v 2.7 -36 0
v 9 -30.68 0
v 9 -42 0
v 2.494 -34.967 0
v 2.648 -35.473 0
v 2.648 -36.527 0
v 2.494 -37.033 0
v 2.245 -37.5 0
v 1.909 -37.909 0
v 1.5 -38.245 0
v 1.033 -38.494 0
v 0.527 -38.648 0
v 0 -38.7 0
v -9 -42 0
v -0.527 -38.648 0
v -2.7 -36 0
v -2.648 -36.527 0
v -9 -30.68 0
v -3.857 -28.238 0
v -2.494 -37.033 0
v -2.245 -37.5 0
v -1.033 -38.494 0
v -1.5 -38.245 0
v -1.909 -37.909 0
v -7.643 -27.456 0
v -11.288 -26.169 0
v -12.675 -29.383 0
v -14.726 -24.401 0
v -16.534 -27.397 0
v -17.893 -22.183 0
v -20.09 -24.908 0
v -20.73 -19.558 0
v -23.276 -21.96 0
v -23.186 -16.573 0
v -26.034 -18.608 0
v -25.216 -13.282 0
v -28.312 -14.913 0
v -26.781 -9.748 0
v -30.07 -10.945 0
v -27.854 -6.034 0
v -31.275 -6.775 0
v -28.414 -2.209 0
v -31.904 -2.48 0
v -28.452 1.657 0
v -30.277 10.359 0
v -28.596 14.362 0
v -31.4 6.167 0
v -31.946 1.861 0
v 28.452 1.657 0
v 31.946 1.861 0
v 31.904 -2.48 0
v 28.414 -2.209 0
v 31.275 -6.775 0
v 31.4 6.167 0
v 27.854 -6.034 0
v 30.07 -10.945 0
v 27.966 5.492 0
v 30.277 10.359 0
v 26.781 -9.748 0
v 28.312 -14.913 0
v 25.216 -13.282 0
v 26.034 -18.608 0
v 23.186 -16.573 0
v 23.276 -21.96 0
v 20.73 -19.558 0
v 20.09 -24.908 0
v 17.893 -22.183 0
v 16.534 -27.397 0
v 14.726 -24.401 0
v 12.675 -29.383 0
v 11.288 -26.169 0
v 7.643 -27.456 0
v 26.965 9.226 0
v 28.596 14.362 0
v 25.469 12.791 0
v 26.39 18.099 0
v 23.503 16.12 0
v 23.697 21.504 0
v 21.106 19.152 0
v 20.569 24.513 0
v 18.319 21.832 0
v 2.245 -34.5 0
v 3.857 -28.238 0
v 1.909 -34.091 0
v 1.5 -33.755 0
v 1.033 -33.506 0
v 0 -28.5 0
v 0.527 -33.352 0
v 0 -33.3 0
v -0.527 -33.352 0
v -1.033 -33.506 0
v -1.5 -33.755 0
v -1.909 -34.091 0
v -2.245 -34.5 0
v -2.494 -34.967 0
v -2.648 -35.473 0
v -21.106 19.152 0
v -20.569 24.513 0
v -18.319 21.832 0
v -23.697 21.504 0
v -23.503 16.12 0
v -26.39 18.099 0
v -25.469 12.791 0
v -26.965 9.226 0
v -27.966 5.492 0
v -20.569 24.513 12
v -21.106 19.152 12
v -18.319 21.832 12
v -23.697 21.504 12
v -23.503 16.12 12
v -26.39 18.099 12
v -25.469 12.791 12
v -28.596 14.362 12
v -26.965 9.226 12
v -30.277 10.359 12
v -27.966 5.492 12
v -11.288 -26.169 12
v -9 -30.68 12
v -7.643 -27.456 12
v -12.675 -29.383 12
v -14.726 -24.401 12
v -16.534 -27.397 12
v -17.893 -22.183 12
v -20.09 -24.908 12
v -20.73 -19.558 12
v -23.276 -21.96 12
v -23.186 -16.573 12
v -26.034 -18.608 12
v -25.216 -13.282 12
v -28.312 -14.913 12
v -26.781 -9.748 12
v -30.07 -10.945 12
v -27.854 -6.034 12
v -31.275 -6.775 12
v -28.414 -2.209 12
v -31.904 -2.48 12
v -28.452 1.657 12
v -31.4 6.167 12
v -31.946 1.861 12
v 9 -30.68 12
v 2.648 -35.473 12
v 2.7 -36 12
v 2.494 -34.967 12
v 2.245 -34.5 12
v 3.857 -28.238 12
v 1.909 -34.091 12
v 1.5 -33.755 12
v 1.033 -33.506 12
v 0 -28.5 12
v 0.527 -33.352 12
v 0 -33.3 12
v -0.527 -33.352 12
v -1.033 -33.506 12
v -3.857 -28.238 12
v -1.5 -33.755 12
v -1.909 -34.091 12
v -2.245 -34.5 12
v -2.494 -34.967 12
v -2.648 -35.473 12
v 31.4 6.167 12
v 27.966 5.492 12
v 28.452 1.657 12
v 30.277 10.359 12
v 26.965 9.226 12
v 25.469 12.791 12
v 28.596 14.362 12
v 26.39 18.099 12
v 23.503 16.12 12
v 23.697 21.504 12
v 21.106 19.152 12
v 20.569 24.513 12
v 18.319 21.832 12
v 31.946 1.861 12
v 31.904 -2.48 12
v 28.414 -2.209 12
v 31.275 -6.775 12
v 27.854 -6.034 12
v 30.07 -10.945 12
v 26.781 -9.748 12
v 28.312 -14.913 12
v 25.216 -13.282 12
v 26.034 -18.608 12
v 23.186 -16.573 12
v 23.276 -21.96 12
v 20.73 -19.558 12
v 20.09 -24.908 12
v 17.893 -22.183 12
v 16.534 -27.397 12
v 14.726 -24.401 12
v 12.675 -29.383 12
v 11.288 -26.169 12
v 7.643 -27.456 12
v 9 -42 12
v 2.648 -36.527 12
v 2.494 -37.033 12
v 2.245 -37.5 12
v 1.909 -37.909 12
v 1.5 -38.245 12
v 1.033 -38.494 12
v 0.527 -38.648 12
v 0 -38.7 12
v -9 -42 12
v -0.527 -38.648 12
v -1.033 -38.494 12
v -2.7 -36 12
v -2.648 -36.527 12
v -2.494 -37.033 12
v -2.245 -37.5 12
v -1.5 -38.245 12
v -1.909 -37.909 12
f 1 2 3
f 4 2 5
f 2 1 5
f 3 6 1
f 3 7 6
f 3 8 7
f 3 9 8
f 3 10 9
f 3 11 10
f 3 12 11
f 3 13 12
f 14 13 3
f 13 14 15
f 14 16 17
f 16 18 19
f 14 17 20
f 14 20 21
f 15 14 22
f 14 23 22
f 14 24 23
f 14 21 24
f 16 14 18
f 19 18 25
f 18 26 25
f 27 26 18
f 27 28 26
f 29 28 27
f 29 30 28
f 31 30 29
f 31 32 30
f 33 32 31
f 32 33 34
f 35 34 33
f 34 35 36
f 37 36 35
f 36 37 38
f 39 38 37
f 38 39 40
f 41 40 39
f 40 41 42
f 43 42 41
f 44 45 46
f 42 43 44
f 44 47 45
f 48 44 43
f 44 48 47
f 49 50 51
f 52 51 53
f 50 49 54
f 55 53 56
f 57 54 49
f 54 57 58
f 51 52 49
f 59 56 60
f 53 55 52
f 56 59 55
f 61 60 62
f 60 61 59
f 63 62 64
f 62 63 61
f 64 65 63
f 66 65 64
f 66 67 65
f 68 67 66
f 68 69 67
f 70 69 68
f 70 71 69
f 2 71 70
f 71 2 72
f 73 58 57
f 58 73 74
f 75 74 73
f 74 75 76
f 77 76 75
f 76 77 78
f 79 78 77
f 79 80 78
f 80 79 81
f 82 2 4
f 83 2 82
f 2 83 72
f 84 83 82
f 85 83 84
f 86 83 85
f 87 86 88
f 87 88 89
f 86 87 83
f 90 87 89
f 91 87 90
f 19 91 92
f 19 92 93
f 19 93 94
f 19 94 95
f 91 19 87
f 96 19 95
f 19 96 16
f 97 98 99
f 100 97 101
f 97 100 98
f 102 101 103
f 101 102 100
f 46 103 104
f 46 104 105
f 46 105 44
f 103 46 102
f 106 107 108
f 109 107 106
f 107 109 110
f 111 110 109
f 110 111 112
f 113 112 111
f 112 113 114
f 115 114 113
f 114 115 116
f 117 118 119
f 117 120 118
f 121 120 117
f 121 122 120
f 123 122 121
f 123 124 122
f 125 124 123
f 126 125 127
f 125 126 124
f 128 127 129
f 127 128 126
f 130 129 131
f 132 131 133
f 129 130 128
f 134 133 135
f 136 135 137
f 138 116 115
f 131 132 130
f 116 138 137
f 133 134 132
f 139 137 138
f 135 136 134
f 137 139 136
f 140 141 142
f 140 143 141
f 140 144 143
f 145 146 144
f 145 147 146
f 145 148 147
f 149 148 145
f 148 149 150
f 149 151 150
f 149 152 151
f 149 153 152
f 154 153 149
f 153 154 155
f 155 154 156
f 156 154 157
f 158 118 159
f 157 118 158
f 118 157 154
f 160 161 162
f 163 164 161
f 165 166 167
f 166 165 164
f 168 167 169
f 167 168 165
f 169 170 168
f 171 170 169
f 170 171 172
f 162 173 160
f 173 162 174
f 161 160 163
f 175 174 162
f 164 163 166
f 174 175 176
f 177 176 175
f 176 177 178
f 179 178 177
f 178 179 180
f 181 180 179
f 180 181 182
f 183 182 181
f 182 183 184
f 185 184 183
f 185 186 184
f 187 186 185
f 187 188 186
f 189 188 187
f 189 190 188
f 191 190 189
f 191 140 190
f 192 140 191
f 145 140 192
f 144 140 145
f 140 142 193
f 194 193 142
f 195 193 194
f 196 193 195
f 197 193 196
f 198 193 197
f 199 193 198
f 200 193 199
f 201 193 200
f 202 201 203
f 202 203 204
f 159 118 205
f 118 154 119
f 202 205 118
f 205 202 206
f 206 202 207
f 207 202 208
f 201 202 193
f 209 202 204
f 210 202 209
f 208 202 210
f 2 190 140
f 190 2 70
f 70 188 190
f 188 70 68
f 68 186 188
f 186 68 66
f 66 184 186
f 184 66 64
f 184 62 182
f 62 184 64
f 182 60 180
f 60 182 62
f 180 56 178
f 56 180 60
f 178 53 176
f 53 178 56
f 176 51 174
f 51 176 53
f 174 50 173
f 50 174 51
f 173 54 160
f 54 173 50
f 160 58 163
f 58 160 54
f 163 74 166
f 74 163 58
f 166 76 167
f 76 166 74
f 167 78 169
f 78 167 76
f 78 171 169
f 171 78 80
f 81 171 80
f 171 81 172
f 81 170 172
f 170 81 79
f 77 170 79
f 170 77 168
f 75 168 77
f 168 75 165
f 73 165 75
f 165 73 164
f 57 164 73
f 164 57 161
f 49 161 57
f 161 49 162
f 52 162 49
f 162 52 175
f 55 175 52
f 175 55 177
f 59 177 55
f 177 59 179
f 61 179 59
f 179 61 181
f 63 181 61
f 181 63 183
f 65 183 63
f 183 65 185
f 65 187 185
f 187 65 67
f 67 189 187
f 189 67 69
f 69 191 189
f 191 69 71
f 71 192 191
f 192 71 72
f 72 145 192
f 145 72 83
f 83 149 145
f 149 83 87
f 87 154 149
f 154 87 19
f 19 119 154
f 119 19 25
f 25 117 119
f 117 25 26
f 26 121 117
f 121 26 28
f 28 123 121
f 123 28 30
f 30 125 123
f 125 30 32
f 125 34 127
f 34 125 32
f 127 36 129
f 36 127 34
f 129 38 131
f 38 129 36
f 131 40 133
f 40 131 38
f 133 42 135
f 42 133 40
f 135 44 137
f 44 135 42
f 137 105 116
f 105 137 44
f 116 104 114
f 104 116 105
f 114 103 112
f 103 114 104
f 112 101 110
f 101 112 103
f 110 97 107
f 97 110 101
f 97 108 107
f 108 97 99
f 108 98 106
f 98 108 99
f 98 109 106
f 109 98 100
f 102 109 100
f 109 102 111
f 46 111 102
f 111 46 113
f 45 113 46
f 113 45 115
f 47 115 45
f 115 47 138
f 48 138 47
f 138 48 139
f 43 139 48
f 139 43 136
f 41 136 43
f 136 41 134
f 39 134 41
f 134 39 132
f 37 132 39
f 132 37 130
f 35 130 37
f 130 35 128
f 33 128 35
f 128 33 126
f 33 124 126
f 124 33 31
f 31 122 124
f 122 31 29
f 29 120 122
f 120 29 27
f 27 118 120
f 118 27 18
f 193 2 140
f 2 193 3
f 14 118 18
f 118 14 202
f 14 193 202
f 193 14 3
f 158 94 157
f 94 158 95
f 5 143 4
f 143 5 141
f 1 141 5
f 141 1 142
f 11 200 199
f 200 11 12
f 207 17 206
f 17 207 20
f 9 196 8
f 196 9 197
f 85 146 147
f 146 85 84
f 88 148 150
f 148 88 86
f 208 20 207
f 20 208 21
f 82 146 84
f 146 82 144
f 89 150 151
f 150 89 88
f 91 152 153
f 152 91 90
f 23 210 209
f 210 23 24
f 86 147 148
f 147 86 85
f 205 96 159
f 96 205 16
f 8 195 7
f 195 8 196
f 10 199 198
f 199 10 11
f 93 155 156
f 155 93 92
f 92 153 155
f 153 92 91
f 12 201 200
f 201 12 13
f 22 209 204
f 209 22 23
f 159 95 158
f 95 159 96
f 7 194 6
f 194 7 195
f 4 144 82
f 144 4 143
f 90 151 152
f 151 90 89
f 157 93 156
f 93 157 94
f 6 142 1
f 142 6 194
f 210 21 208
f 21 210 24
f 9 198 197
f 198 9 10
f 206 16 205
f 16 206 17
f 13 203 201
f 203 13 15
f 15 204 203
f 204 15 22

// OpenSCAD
$fn = 32;

// ----------------------------------------------------------------------
// Spring clip: 64 mm outside, 3.5 mm band, 80 degree opening
// ----------------------------------------------------------------------

// --- parameters (mm) ---
outer_r = 32;             // clip outside radius
inner_r = 28.5;           // clip bore radius
band = 3.5;               // band thickness
clip_w = 12;              // clip width
opening = 80;             // opening angle
tab_w = 18;               // tab width
tab_len = 10;             // tab length past the clip
tab_hole = 5.4;           // tab fixing hole

clip_profile = [[-20.569, 24.513], [-23.697, 21.504], [-26.39, 18.099], [-28.596, 14.362], [-30.277, 10.359], [-31.4, 6.167], [-31.946, 1.861], [-31.904, -2.48], [-31.275, -6.775], [-30.07, -10.945], [-28.312, -14.913], [-26.034, -18.608], [-23.276, -21.96], [-20.09, -24.908], [-16.534, -27.397], [-12.675, -29.383], [-8.582, -30.828], [-4.331, -31.706], [0, -32], [4.331, -31.706], [8.582, -30.828], [12.675, -29.383], [16.534, -27.397], [20.09, -24.908], [23.276, -21.96], [26.034, -18.608], [28.312, -14.913], [30.07, -10.945], [31.275, -6.775], [31.904, -2.48], [31.946, 1.861], [31.4, 6.167], [30.277, 10.359], [28.596, 14.362], [26.39, 18.099], [23.697, 21.504], [20.569, 24.513], [18.319, 21.832], [21.106, 19.152], [23.503, 16.12], [25.469, 12.791], [26.965, 9.226], [27.966, 5.492], [28.452, 1.657], [28.414, -2.209], [27.854, -6.034], [26.781, -9.748], [25.216, -13.282], [23.186, -16.573], [20.73, -19.558], [17.893, -22.183], [14.726, -24.401], [11.288, -26.169], [7.643, -27.456], [3.857, -28.238], [0, -28.5], [-3.857, -28.238], [-7.643, -27.456], [-11.288, -26.169], [-14.726, -24.401], [-17.893, -22.183], [-20.73, -19.558], [-23.186, -16.573], [-25.216, -13.282], [-26.781, -9.748], [-27.854, -6.034], [-28.414, -2.209], [-28.452, 1.657], [-27.966, 5.492], [-26.965, 9.226], [-25.469, 12.791], [-23.503, 16.12], [-21.106, 19.152], [-18.319, 21.832]];

difference() {
  union() {
    linear_extrude(height = clip_w) polygon(clip_profile);
    /* mounting tab, sunk 2 mm into the band */
    translate([-9, -42, 0]) cube([tab_w, 12, clip_w]);
  }
  translate([0, -36, -2.5]) cylinder(h = clip_w + 5, d = tab_hole);
}
